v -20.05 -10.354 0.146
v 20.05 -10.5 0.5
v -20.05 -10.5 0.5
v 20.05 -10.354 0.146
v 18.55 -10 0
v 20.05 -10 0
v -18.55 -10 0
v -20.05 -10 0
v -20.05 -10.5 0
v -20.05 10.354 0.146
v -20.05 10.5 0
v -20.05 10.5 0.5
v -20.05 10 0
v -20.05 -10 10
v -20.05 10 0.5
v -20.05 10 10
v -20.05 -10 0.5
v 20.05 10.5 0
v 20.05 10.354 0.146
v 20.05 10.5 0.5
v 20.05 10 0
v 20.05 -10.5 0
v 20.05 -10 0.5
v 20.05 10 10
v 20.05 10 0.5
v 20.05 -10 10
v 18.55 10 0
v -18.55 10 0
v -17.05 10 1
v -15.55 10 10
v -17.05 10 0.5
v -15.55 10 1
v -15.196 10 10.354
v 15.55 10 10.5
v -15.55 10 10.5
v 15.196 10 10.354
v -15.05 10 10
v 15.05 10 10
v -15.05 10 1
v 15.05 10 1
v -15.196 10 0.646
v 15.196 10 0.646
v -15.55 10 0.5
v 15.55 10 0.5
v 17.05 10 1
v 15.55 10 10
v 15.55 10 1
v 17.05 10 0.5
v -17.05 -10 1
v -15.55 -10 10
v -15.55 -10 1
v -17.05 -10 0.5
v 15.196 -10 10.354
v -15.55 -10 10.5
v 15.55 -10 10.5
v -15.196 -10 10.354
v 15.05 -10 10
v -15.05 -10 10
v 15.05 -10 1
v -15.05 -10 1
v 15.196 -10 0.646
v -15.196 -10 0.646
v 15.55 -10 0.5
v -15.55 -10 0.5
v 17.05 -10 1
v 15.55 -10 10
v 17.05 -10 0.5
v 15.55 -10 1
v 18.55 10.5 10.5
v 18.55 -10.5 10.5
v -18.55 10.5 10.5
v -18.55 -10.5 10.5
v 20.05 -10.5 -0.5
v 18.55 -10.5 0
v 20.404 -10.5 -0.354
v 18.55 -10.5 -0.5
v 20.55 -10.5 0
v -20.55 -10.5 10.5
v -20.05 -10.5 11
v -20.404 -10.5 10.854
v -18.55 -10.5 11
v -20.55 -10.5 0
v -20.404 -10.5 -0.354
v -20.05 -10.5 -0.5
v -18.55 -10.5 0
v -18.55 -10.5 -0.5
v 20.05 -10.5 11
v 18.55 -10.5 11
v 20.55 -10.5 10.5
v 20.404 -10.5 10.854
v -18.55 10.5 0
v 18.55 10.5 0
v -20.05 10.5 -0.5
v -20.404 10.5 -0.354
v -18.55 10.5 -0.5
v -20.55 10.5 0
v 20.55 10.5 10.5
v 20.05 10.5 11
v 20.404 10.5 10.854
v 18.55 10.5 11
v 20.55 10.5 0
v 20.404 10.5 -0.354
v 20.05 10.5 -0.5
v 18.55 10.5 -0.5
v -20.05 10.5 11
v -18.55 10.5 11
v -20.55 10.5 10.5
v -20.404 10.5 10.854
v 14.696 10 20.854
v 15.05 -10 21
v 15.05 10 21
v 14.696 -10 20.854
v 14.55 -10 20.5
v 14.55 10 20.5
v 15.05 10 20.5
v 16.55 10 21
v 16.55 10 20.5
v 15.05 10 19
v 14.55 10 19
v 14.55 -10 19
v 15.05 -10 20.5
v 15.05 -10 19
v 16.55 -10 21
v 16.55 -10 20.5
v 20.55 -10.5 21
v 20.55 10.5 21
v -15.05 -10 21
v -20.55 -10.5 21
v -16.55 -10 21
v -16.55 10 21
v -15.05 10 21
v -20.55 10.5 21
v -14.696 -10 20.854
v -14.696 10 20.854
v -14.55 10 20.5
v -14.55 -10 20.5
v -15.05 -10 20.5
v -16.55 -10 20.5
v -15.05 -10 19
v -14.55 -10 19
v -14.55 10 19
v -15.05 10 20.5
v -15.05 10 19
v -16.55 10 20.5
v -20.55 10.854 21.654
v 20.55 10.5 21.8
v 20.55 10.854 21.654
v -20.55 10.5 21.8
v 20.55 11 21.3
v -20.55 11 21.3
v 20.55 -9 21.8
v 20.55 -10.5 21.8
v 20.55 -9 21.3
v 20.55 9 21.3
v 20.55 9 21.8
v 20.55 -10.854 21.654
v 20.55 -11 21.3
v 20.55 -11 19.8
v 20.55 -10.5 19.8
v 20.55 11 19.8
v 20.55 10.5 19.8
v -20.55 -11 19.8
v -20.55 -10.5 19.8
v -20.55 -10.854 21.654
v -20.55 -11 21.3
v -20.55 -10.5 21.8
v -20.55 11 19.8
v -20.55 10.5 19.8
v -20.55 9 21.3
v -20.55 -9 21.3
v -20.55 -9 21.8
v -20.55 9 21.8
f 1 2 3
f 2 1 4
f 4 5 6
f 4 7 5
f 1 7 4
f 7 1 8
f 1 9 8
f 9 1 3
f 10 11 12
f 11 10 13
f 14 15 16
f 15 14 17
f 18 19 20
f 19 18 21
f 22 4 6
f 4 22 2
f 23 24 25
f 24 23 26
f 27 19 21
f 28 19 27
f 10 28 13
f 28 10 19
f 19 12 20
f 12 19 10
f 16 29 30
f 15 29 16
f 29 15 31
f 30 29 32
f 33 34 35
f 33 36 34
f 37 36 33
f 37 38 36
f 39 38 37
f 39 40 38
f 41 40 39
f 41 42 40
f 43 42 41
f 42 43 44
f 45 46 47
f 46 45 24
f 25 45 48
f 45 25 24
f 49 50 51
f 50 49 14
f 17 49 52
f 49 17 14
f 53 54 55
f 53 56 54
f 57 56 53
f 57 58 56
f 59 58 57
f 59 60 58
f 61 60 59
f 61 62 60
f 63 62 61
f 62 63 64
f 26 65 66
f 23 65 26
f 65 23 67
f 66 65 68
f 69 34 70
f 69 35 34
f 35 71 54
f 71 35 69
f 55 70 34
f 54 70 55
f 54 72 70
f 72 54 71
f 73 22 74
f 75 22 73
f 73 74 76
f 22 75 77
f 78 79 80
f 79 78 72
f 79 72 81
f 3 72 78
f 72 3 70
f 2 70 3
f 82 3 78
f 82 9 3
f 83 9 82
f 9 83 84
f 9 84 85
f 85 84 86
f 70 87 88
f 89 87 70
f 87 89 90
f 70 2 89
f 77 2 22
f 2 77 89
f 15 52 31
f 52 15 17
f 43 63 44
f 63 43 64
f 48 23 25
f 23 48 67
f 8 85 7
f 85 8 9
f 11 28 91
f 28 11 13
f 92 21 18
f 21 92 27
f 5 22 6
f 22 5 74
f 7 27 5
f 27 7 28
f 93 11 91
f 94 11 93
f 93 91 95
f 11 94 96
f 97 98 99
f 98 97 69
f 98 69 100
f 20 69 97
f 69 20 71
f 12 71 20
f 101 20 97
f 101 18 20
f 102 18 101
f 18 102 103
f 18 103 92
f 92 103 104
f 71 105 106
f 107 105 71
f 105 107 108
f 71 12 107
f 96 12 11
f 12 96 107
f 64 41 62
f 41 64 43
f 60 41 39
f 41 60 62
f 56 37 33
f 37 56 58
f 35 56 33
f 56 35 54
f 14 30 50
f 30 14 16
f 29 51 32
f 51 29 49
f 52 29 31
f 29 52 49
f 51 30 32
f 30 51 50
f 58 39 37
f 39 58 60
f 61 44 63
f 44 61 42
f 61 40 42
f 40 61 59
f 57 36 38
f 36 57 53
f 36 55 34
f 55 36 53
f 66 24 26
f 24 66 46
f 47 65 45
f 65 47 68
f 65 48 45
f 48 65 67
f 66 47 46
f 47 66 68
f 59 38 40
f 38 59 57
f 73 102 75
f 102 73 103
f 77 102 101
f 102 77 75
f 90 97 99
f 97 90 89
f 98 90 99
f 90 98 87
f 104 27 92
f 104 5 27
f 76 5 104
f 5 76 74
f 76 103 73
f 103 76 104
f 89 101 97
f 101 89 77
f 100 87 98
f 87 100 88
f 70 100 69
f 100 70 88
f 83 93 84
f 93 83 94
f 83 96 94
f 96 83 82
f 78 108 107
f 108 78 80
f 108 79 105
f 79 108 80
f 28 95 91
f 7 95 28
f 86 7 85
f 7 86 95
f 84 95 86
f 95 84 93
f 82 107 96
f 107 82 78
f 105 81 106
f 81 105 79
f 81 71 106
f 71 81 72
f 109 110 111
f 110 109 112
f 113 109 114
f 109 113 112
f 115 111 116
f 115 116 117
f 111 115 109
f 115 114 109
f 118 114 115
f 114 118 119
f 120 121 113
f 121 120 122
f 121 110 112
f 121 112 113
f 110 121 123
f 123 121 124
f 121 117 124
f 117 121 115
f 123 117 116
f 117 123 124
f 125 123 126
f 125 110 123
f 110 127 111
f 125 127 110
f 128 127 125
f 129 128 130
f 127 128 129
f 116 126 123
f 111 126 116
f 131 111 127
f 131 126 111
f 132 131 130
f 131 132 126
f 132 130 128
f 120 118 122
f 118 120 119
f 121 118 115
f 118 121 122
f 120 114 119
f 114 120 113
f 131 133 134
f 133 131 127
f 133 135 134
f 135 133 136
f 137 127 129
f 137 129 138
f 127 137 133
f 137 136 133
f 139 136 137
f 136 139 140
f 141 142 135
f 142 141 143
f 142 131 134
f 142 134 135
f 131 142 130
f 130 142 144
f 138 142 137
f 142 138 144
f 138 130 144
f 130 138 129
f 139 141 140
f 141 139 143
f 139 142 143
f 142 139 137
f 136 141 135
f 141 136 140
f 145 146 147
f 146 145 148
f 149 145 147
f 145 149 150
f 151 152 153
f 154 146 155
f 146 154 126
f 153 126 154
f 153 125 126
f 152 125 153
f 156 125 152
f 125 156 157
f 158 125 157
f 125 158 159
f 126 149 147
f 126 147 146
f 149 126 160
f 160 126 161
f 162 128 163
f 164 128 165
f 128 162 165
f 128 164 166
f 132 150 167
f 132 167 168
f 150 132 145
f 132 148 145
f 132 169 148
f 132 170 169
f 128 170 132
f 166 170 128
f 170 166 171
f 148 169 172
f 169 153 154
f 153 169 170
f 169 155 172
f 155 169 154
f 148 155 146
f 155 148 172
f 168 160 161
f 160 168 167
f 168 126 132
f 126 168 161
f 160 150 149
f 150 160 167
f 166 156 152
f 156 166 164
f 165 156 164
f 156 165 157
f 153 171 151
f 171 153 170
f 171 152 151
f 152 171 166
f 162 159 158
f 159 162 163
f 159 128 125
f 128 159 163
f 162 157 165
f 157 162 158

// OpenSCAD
//!OpenSCAD
// dimensions
inner_w = 301;
inner_d = 200;
inner_h = 100;
elec_size = 50; //min 20

// material
k = 1; // k-factor for material bending
material_thickness = 5;
bending_r = 5; // min material thickness

$fn=8;
w = inner_w + 2*elec_size;
d = inner_d + 2*material_thickness;
h = inner_h + material_thickness;

scale([.1,.1,.1]){
    housing(w=w, d=d, h=h, t=material_thickness, r=bending_r);
    translate([0,0,100])lid(w=w, d=d, h=h, t=material_thickness, r=bending_r);
}

module lid(w=300, d=200, h=50, t=1, r=1){
	translate([0,0,h+t]){
		translate([-w/2-t,-d/2,0])color("cyan")cube([w+2*t,d,3]);
		for(m=[0,180])rotate([0,0,m])translate([0,-d/2+t,0]){
			translate([w/2-elec_size-t,0,0])rotate([0,90,0])l_profile(a=20,b=20,l=d-2*t,r=r,t=t);
		}
		for(m=[0,180])rotate([0,0,m])translate([-w/2-t,0,3+t]){
			translate([0,d/2+t,0])rotate([0,90,-90])l_profile(a=20,b=20,l=w+2*t,r=r,t=t);
		}
	}
}


module housing(w=300, d=200, h=50, t=1, r=1){
	material_thickness = t;
	bending_r = r;

	hi = h - material_thickness;
	ho = h + 2*material_thickness;
	di = d - 2*material_thickness;

	overlap = 20;
	
	// base
	translate([w/2,-d/2,0])rotate([0,0,90])c_profile(a=h,b=d,c=h,l=w,r=bending_r,t=material_thickness);
	
	// electronics separator

	translate([-w/2+elec_size,-d/2+material_thickness,material_thickness])rotate([0,-90,0])c_profile(a=overlap,b=hi,c=elec_size,l=di,r=bending_r,t=material_thickness);
	rotate([0,0,180])translate([-w/2+elec_size,-d/2+material_thickness,material_thickness])rotate([0,-90,0])c_profile(a=overlap,b=hi,c=elec_size,l=di,r=bending_r,t=material_thickness);
	
	// sides
	translate([w/2+material_thickness,-d/2,-material_thickness])rotate([0,-90,0])c_profile(a=overlap,b=ho,c=overlap,l=d,r=bending_r,t=material_thickness);
	rotate([0,0,180])translate([w/2+material_thickness,-d/2,-material_thickness])rotate([0,-90,0])c_profile(a=overlap,b=ho,c=overlap,l=d,r=bending_r,t=material_thickness);
}

module c_profile(a=10, b=20, c=10, l=100, t=1, r=1){
	translate([0,0,r])cube([t,l,a-r]);
	rotate([0,0,180])bend90(r,t,l);

	translate([r,0,0])cube([b-2*r,l,t]);
	translate([b,0,0])rotate([0,90,180])bend90(r,t,l);

	translate([b-t,0,r])cube([t,l,c-r]);
	echo(str("C-profile sheet:", a+b+c,"x",l));
	kc = k_correction(r,t);
	echo(str("C-profile sheet k-corrected:", a+b+c+kc*2,"x",l));
}	

module l_profile(a=10, b=20, l=100, t=1, r=1){
	translate([0,0,r])cube([t,l,a-r]);
	rotate([0,0,180])bend90(r,t,l);

	translate([r,0,0])cube([b-r,l,t]);
	echo(str("L-profile sheet:", a+b,"x",l));
	kc = k_correction(r,t);
	echo(str("L-profile sheet k-corrected:", a+b+kc,"x",l));	
}	

module bend90(r,t,l){
	translate([-r,0,r])rotate([90,0,0])intersection(){
		ring(ri=r-t,ro=r,h=l);
		translate([0,0,-0.1])mirror([0,1,0])cube([r+0.1,r+0.1,l+0.2]);
	}
}

function k_correction(r, t) = t*k;


module ring(ro=8, ri=6, h=4){
	difference(){
		cylinder(r=ro, h=h);
		translate([0,0,-1])cylinder(r=ri, h=h+2);
	}
}
